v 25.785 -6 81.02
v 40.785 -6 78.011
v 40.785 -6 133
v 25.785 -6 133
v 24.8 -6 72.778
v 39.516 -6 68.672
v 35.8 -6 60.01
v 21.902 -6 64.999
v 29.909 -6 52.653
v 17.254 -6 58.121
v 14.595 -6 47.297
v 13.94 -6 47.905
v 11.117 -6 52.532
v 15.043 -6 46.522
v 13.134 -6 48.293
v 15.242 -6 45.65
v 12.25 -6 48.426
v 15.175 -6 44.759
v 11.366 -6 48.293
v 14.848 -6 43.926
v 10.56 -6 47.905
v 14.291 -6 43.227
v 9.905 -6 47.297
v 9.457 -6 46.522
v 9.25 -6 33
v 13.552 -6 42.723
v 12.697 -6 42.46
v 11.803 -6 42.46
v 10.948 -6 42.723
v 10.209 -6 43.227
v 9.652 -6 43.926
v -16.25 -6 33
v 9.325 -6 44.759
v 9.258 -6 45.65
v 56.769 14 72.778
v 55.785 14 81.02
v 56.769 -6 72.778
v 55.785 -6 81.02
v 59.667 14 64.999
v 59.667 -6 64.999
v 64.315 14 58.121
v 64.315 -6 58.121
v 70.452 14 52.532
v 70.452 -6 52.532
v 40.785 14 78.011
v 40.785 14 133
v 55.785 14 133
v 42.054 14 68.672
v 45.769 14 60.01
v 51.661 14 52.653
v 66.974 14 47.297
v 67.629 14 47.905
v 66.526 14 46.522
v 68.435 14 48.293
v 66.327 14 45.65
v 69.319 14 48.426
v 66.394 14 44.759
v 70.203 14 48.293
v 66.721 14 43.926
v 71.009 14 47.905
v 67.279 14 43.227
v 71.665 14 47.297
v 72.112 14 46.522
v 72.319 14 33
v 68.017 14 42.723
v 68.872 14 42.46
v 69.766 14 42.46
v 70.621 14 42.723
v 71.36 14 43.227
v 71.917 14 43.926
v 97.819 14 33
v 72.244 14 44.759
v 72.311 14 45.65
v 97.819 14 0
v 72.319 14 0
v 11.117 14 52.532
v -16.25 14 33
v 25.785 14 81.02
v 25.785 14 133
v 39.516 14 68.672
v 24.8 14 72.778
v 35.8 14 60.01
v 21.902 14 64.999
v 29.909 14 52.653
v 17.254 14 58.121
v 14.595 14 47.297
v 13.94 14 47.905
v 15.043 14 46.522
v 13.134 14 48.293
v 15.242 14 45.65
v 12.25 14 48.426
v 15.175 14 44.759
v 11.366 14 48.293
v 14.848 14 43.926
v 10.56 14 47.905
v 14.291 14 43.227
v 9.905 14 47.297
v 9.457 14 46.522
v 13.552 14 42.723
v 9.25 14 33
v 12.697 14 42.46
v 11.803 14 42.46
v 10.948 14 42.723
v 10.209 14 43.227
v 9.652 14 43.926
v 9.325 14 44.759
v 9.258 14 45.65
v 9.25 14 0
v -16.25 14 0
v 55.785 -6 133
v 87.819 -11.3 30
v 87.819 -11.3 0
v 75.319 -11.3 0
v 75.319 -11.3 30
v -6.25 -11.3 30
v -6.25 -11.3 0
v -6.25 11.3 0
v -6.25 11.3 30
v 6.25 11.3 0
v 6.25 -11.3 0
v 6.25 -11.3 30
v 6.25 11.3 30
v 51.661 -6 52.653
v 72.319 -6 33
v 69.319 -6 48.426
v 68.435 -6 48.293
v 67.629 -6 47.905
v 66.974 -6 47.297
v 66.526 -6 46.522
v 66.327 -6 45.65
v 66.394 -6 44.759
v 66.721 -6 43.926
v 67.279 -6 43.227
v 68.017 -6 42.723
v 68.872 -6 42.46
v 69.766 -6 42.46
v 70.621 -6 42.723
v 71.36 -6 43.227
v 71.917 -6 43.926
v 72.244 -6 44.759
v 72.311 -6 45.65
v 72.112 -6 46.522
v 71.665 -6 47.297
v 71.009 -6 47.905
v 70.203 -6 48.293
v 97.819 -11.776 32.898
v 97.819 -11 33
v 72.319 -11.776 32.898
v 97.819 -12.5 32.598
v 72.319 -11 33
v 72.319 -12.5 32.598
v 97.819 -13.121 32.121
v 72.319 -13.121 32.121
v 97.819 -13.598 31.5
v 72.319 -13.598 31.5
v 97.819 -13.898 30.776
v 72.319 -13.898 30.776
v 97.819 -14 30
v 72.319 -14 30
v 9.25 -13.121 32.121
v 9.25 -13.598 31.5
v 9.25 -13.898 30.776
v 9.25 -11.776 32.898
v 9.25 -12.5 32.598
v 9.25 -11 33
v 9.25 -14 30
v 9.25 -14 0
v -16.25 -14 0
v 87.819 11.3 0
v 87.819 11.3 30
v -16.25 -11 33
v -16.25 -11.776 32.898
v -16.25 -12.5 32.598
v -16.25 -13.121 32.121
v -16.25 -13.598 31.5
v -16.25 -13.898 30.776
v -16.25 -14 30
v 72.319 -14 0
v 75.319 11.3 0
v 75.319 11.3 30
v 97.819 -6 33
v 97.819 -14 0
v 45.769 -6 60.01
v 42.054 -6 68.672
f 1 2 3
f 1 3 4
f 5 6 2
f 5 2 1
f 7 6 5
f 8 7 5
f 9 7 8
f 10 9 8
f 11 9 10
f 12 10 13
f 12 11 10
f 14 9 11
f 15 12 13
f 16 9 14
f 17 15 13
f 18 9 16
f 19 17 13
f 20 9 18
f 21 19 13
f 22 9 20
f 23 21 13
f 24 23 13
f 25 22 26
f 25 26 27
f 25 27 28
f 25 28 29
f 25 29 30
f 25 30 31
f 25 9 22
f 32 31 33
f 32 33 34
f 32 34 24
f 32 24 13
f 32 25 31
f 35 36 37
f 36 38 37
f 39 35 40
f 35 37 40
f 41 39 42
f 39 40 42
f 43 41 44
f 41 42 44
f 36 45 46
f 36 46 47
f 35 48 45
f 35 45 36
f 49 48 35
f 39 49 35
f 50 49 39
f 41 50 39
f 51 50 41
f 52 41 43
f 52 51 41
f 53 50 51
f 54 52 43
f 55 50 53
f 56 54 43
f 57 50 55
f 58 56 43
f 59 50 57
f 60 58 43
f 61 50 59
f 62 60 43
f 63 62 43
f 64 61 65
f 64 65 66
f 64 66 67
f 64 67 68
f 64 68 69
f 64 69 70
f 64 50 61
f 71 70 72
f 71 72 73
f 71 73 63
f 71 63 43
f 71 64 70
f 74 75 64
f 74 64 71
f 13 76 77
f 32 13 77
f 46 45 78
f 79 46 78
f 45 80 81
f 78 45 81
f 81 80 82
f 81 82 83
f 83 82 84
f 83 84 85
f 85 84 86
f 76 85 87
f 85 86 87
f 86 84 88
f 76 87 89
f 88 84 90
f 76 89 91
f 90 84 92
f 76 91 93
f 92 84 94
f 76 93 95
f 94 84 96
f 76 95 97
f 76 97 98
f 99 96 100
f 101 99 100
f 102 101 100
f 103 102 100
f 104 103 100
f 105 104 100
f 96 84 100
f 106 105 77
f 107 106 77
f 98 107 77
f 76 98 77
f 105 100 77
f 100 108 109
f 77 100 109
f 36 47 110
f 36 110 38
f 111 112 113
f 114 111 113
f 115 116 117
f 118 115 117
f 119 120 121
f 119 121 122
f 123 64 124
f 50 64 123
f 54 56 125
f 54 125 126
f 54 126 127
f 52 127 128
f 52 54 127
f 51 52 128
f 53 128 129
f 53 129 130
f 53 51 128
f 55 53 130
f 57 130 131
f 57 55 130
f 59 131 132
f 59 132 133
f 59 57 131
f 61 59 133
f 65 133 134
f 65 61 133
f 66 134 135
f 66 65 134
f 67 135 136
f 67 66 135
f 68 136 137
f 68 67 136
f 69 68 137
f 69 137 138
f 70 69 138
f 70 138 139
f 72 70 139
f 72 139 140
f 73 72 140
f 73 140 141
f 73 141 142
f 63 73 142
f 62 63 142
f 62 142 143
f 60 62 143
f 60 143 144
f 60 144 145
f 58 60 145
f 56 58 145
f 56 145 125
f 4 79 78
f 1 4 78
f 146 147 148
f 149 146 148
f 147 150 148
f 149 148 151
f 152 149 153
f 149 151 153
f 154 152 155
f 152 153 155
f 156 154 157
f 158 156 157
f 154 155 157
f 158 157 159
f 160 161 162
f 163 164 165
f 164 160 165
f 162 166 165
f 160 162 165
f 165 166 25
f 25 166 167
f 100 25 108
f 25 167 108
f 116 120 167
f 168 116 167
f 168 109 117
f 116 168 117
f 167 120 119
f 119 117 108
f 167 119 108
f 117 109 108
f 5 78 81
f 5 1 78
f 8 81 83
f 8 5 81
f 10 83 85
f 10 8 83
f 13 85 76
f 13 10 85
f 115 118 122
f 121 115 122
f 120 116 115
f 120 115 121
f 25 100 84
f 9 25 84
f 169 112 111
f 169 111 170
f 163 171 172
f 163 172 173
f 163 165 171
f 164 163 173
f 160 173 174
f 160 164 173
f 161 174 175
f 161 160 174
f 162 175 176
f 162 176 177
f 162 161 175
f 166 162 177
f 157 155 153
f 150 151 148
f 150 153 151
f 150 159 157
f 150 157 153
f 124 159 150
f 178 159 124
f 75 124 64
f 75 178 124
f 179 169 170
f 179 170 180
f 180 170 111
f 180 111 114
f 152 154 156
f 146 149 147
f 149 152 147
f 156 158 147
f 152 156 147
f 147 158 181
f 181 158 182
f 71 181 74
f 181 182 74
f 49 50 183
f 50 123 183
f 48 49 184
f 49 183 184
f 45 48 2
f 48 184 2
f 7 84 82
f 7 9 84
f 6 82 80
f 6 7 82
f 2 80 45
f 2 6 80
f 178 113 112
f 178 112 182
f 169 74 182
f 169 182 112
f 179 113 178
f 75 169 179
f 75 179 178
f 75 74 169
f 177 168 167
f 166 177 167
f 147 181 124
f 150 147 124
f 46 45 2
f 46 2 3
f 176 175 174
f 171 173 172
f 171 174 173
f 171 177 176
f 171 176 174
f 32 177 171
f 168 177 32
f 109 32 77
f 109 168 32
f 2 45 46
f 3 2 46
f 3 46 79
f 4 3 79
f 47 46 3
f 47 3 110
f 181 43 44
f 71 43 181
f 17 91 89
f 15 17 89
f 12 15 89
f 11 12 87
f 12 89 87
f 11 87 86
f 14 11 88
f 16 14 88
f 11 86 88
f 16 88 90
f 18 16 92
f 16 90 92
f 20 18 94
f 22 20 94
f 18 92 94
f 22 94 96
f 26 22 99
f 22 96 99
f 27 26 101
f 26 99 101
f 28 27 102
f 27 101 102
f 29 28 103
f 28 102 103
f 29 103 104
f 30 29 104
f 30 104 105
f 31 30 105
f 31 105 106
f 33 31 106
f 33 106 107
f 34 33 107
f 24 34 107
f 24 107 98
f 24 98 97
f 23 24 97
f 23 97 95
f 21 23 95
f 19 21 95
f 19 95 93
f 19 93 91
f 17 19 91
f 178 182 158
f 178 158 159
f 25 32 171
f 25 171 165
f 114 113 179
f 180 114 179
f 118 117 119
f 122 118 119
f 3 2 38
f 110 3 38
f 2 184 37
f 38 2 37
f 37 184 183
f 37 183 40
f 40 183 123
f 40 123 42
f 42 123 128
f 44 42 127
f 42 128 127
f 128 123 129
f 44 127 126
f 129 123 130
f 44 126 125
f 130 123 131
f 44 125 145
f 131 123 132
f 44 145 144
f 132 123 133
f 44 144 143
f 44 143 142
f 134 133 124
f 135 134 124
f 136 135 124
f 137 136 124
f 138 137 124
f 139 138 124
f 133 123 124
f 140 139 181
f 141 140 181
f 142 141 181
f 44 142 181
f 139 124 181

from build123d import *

# Parameters (mm, degrees)
SKETCH_1_W          = 25.5
SKETCH_1_H          = 28
SKETCH_1_W_2        = 12.5
SKETCH_1_H_2        = 22.6
EXTRUDE_1_DEPTH     = 30
SKETCH_2_W          = 25.5
SKETCH_2_H          = 28
EXTRUDE_2_DEPTH     = 3
EXTRUDE_4_DEPTH     = 20
FILLET_5_R          = 3
FILLET_7_R          = 35
SKETCH_8_R          = 3
CUT_EXTRUDE_1_DEPTH = 30


with BuildPart() as part:
    # 스케치1 → 보스-돌출1 (new body)
    with BuildSketch(Plane.XY):
        with Locations((-3.5, 0)):
            Rectangle(SKETCH_1_W, SKETCH_1_H)
        Rectangle(SKETCH_1_W_2, SKETCH_1_H_2, mode=Mode.SUBTRACT)
    extrude(amount=EXTRUDE_1_DEPTH)

    # 스케치2 → 보스-돌출2 (add)
    with BuildSketch(Plane.XY.offset(30)):
        with Locations((-3.5, 0)):
            Rectangle(SKETCH_2_W, SKETCH_2_H)
    extrude(amount=EXTRUDE_2_DEPTH)

    # 스케치7 → 보스-돌출4 (add)
    with BuildSketch(Plane(origin=(0, 14, 0), x_dir=(1, 0, 0), z_dir=(0, 1, 0))):
        Polygon((9.25, -33), (40.784552994, -63), (40.784552994, -133), (25.784552994, -133), (25.784552994, -63), (-16.25, -33), align=None)
    extrude(amount=-EXTRUDE_4_DEPTH)

    # 필렛5
    fillet_5_edges = [part.edges().sort_by_distance(p)[0] for p in [
        (-3.5, -14, 33),
    ]]
    fillet(fillet_5_edges, radius=FILLET_5_R)

    # 필렛7
    fillet_7_edges = [part.edges().sort_by_distance(p)[0] for p in [
        (40.784552994, 4, 63),
        (25.784552994, 4, 63),
    ]]
    fillet(fillet_7_edges, radius=FILLET_7_R)

    # 스케치8 → 컷-돌출1 (cut)
    with BuildSketch(Plane(origin=(0, 14, 0), x_dir=(1, 0, 0), z_dir=(0, 1, 0))):
        with Locations(Location((12.25, -45.426066506, 0), (0, 0, 270))):
            Circle(SKETCH_8_R)
    extrude(amount=-CUT_EXTRUDE_1_DEPTH, mode=Mode.SUBTRACT)


with BuildPart() as body_2:
    # 대칭 복사3: mirrored copy
    add(part.part.mirror(Plane(origin=(40.784552994, -6, 133), x_dir=(0, 0, 1), z_dir=(1, 0, 0))))


solid = Compound([part.part, body_2.part])
